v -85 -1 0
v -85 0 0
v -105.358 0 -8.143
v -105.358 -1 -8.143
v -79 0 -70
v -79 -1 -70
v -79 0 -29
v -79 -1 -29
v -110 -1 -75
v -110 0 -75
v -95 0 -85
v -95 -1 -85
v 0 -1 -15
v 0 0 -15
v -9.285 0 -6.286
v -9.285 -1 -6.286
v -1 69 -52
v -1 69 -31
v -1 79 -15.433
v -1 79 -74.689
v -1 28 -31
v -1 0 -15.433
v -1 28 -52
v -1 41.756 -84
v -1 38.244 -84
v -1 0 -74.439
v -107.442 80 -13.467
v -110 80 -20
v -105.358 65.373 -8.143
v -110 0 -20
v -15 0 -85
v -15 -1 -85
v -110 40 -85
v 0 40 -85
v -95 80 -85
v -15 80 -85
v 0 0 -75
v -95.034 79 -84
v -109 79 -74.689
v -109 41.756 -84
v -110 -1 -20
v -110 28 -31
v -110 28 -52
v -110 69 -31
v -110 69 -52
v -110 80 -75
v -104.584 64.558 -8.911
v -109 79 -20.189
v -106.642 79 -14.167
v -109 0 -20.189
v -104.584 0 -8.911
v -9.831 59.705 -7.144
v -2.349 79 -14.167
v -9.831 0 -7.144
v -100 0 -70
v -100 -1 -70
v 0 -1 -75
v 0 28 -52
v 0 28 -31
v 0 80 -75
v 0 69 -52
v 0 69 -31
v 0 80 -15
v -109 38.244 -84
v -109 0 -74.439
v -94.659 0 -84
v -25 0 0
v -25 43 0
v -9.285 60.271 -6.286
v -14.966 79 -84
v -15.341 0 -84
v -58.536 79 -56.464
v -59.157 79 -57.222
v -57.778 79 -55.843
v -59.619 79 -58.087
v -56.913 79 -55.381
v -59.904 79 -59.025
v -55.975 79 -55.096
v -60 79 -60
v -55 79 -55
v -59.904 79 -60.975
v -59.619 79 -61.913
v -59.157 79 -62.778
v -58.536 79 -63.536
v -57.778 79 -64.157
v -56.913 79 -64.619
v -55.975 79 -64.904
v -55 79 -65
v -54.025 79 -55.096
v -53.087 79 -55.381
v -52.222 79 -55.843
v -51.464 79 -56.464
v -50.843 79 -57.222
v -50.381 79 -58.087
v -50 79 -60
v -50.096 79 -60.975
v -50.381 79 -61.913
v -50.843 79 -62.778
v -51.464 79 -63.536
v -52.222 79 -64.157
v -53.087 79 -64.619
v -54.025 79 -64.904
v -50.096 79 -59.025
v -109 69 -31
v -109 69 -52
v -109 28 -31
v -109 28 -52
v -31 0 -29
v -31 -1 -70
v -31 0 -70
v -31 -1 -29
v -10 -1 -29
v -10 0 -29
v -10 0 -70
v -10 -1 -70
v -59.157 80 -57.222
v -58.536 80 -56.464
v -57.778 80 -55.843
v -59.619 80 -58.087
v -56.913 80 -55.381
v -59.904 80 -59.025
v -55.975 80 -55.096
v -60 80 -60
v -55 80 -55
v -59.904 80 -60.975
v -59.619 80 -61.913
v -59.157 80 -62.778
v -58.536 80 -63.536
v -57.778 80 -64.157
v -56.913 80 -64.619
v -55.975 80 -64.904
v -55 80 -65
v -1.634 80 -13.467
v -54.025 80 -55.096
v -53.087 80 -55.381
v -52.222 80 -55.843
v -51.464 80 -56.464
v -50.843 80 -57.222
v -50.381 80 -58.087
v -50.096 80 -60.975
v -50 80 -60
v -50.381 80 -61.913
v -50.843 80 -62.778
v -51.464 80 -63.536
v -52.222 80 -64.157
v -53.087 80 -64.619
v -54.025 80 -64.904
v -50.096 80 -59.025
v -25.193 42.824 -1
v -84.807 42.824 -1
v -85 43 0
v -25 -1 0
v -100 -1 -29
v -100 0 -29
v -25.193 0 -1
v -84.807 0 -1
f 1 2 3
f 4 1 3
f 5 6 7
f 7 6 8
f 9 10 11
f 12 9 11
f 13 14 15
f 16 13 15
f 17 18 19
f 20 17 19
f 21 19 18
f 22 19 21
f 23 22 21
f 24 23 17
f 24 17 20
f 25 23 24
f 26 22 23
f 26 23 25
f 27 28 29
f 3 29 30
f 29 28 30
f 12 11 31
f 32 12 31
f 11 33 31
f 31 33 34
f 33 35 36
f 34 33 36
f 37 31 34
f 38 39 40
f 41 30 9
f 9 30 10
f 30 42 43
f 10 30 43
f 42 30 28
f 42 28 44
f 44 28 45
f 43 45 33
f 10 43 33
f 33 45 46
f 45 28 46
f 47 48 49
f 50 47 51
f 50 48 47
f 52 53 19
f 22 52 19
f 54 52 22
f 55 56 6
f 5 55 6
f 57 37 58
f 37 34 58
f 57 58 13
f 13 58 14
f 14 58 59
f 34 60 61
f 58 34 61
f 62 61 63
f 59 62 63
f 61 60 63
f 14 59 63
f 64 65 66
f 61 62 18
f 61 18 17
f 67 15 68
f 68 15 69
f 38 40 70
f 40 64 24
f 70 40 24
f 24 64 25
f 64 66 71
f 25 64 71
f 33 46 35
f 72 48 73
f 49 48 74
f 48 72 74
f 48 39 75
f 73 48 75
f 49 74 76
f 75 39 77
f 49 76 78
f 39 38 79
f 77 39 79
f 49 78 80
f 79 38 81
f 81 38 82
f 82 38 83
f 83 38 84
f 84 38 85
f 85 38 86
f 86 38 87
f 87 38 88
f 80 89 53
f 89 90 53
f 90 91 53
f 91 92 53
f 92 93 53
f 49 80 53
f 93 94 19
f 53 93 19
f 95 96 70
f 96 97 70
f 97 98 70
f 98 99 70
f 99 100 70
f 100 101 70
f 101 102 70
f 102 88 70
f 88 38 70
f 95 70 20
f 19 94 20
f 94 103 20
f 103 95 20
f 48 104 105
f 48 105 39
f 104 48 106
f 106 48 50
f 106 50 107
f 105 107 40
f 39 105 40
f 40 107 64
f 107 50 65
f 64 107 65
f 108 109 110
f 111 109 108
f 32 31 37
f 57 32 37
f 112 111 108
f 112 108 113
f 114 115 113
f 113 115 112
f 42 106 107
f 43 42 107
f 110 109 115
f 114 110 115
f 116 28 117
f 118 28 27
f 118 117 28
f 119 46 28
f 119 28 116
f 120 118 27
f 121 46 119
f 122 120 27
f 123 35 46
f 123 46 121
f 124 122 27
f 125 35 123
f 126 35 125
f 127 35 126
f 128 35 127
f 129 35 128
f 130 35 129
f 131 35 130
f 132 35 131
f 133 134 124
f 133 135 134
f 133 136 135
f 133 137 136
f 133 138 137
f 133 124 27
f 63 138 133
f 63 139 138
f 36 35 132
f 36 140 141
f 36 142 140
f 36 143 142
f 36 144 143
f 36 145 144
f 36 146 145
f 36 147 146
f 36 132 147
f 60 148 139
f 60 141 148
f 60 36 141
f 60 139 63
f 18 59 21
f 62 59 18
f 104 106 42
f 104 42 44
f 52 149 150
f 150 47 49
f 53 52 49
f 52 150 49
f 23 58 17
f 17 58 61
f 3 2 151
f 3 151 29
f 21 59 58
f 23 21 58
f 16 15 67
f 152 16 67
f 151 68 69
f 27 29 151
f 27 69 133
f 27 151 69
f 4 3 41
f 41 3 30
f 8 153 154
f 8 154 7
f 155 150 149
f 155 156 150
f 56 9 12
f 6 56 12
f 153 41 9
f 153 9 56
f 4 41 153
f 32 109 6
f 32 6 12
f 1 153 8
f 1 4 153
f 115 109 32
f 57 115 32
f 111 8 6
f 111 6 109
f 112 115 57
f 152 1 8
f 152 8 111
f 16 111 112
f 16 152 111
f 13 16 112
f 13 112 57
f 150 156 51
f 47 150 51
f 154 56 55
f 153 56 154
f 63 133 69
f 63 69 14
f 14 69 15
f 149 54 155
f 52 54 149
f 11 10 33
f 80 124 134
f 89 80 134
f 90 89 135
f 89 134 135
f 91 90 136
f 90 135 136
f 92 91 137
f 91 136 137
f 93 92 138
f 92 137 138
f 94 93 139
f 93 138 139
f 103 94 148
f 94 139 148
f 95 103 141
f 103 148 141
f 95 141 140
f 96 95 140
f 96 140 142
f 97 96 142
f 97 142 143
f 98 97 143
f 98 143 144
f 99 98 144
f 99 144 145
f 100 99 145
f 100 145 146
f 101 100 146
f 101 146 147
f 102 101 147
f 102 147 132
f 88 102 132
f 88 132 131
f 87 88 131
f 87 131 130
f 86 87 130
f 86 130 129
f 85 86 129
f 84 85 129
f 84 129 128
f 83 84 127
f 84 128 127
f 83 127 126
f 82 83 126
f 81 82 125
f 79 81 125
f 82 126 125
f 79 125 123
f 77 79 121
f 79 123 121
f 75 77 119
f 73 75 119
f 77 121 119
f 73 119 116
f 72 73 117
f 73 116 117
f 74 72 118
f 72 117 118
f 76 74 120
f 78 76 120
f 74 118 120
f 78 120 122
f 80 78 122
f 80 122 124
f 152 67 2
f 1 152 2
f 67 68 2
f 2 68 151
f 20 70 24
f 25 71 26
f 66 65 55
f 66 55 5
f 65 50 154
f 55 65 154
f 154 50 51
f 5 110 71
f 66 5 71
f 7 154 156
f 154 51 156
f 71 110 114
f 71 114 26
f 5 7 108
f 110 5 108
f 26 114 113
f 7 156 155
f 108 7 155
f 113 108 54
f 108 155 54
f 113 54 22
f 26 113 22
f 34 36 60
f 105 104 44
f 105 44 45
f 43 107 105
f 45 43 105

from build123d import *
from OCP.BRepFilletAPI import BRepFilletAPI_MakeChamfer

# Parameters (mm, degrees)
SKETCH_1_W                 = 110
SKETCH_1_H                 = 85
EXTRUDE_1_DEPTH            = 80
CUT_EXTRUDE_1_REACH        = 162.39
CHAMFER_1_SIZE             = 5
CHAMFER_1_SIZE2            = 10
SPLIT_START                = 61.095980997
SPLIT_BODIES_3_OUTLINE_W   = 98
SPLIT_BODIES_3_OUTLINE_H   = 75
SPLIT_BODIES_3_DEPTH       = 8.1461308
SPLIT_START_2              = -128.980404327
SPLIT_BODIES_3_2_OUTLINE_W = 98
SPLIT_BODIES_3_2_OUTLINE_H = 75
SPLIT_BODIES_3_2_DEPTH     = 8.146130799
SPLIT_START_3              = -145.272665927
SPLIT_BODIES_3_3_OUTLINE_W = 98
SPLIT_BODIES_3_3_OUTLINE_H = 76
SPLIT_BODIES_3_3_DEPTH     = 8.1461308
SPLIT_START_4              = 77.388242596
SPLIT_BODIES_3_4_OUTLINE_W = 99
SPLIT_BODIES_3_4_OUTLINE_H = 76
SPLIT_BODIES_3_4_DEPTH     = 8.1461308
SHELL_2_T                  = -1
SKETCH_6_R                 = 5
CUT_EXTRUDE_2_DEPTH        = 10
SKETCH_7_W                 = 21
SKETCH_7_H                 = 41
CUT_EXTRUDE_3_DEPTH        = 161.390149323
EXTRUDE_2_DEPTH            = 1
SKETCH_9_W                 = 21
SKETCH_9_H                 = 41
CUT_EXTRUDE_5_DEPTH        = 1


# Read off the part's stored shape, not the designer's step: 分割3
with BuildPart() as part:
    # 草图1 → 凸台-拉伸1 (new body)
    with BuildSketch(Plane(origin=(0, 0, 0), x_dir=(1, 0, 0), z_dir=(0, 1, 0))):
        with Locations((-55, 42.5)):
            Rectangle(SKETCH_1_W, SKETCH_1_H)
    extrude(amount=EXTRUDE_1_DEPTH)

    # 草图2 → 切除-拉伸1 (cut, up to next)
    with BuildSketch(Plane(origin=(0, 80, 0), x_dir=(1, 0, 0), z_dir=(0, 1, 0)), mode=Mode.PRIVATE) as cut_extrude_1_sk1:
        Polygon((-85, 0), (-110, 10), (-110, 0), align=None)
    cut_extrude_1_tool1 = extrude(cut_extrude_1_sk1.sketch, amount=-CUT_EXTRUDE_1_REACH, mode=Mode.PRIVATE) & part.part
    # 草图2 → 切除-拉伸1 (cut, up to next)
    with BuildSketch(Plane(origin=(0, 80, 0), x_dir=(1, 0, 0), z_dir=(0, 1, 0)), mode=Mode.PRIVATE) as cut_extrude_1_sk2:
        Polygon((0, 10), (-25, 0), (0, 0), align=None)
    cut_extrude_1_tool2 = extrude(cut_extrude_1_sk2.sketch, amount=-CUT_EXTRUDE_1_REACH, mode=Mode.PRIVATE) & part.part
    add(cut_extrude_1_tool1.solids().sort_by_distance((-101.666667, 80, -3.333333))[0], mode=Mode.SUBTRACT)
    add(cut_extrude_1_tool2.solids().sort_by_distance((-8.333333, 80, -3.333333))[0], mode=Mode.SUBTRACT)

    # Split Bodies 2
    split(bisect_by=Plane(origin=(0, 5.030044473, 13.819933608), x_dir=(0, 0.9396926207859094, -0.3420201433256661), z_dir=(0, 0.3420201433256661, 0.9396926207859094)), keep=Keep.BOTTOM)

    # 倒角1: one chamfer whose edges measure the first distance from different faces: ONE call of the kernel's chamfer builder (chamfer() names one face for all edges)
    chamfer_1_edges_1 = [part.edges().sort_by_distance(p)[0] for p in [
        (-110, 35.237387097, -10),
    ]]
    chamfer_1_side_1 = [part.faces().sort_by_distance(p)[0] for p in [
        (-98.508842949, 28.923048193, -5.40353718),
    ]]
    chamfer_1_edges_2 = [part.edges().sort_by_distance(p)[0] for p in [
        (0, 35.237387097, -10),
    ]]
    chamfer_1_side_2 = [part.faces().sort_by_distance(p)[0] for p in [
        (0, 39.898381252, -47.600292644),
    ]]
    chamfer_1 = BRepFilletAPI_MakeChamfer(part.part.solid().wrapped)
    for e in chamfer_1_edges_1:
        chamfer_1.Add(CHAMFER_1_SIZE, CHAMFER_1_SIZE2, e.wrapped, chamfer_1_side_1[0].wrapped)  # the first distance lies on this face
    for e in chamfer_1_edges_2:
        chamfer_1.Add(CHAMFER_1_SIZE, CHAMFER_1_SIZE2, e.wrapped, chamfer_1_side_2[0].wrapped)  # the first distance lies on this face
    add(Compound.cast(chamfer_1.Shape()), mode=Mode.REPLACE)

    # Split Bodies 3 outline → Split Bodies 3 (cut)
    with BuildSketch(Plane(origin=(0, 0, 0), x_dir=(0.839683943173837, 0.13171512834099375, 0.5268605133639755), z_dir=(0.5430753866417041, -0.20365326999063904, -0.8146130799625572)).offset(SPLIT_START)):
        with Locations((-79, -54.5)):
            Rectangle(SPLIT_BODIES_3_OUTLINE_W, SPLIT_BODIES_3_OUTLINE_H)
    extrude(amount=SPLIT_BODIES_3_DEPTH, mode=Mode.SUBTRACT)

    # Split Bodies 3 2 outline → Split Bodies 3 2 (cut)
    with BuildSketch(Plane(origin=(0, 0, 0), x_dir=(0.8396839431738365, -0.13171512834099394, -0.5268605133639763), z_dir=(0.5430753866417047, 0.20365326999063899, 0.8146130799625568)).offset(SPLIT_START_2)):
        with Locations((-13, 54.5)):
            Rectangle(SPLIT_BODIES_3_2_OUTLINE_W, SPLIT_BODIES_3_2_OUTLINE_H)
    extrude(amount=SPLIT_BODIES_3_2_DEPTH, mode=Mode.SUBTRACT)

    # Split Bodies 3 3 outline → Split Bodies 3 3 (cut)
    with BuildSketch(Plane(origin=(0, 0, 0), x_dir=(0.8396839431738365, 0.13171512834099394, -0.5268605133639763), z_dir=(0.5430753866417047, -0.20365326999063899, 0.8146130799625568)).offset(SPLIT_START_3)):
        with Locations((-2, 23)):
            Rectangle(SPLIT_BODIES_3_3_OUTLINE_W, SPLIT_BODIES_3_3_OUTLINE_H)
    extrude(amount=SPLIT_BODIES_3_3_DEPTH, mode=Mode.SUBTRACT)

    # Split Bodies 3 4 outline → Split Bodies 3 4 (cut)
    with BuildSketch(Plane(origin=(0, 0, 0), x_dir=(0.839683943173837, -0.13171512834099375, 0.5268605133639755), z_dir=(0.5430753866417041, 0.20365326999063904, -0.8146130799625572)).offset(SPLIT_START_4)):
        with Locations((-89.5, -23)):
            Rectangle(SPLIT_BODIES_3_4_OUTLINE_W, SPLIT_BODIES_3_4_OUTLINE_H)
    extrude(amount=SPLIT_BODIES_3_4_DEPTH, mode=Mode.SUBTRACT)

    # 抽壳2
    shell_2_openings = [part.faces().sort_by_distance(p)[0] for p in [
        (-54.995965718, 0, -43.10116127),
    ]]
    offset(amount=SHELL_2_T, openings=shell_2_openings, kind=Kind.INTERSECTION)

    # 草图6 → 切除-拉伸2 (cut)
    with BuildSketch(Plane(origin=(0, 80, 0), x_dir=(1, 0, 0), z_dir=(0, 1, 0))):
        with Locations(Location((-55, 60, 0), (0, 0, 270))):
            Circle(SKETCH_6_R)
    extrude(amount=-CUT_EXTRUDE_2_DEPTH, mode=Mode.SUBTRACT)

    # 草图7 → 切除-拉伸3 (cut, through all)
    with BuildSketch(Plane(origin=(0, 0, 0), x_dir=(0, 0, -1), z_dir=(1, 0, 0))):
        with Locations((41.5, 48.5)):
            Rectangle(SKETCH_7_W, SKETCH_7_H)
    extrude(amount=-CUT_EXTRUDE_3_DEPTH, mode=Mode.SUBTRACT)

    # 草图8 → 凸台-拉伸2 (add)
    with BuildSketch(Plane.XZ):
        Polygon((-110, -75), (-95, -85), (-15, -85), (0, -75), (0, -15), (-9.284766909, -6.286093236), (-25, 0), (-85, 0), (-105.357616546, -8.143046618), (-110, -20), align=None)
    extrude(amount=EXTRUDE_2_DEPTH)

    # 草图9 → 切除-拉伸5 (cut)
    with BuildSketch(Plane.XZ.offset(1)):
        with Locations((-20.5, -49.5)):
            Rectangle(SKETCH_9_W, SKETCH_9_H)
        with Locations((-89.5, -49.5)):
            Rectangle(SKETCH_9_W, SKETCH_9_H)
    extrude(amount=-CUT_EXTRUDE_5_DEPTH, mode=Mode.SUBTRACT)


solid = part.part
